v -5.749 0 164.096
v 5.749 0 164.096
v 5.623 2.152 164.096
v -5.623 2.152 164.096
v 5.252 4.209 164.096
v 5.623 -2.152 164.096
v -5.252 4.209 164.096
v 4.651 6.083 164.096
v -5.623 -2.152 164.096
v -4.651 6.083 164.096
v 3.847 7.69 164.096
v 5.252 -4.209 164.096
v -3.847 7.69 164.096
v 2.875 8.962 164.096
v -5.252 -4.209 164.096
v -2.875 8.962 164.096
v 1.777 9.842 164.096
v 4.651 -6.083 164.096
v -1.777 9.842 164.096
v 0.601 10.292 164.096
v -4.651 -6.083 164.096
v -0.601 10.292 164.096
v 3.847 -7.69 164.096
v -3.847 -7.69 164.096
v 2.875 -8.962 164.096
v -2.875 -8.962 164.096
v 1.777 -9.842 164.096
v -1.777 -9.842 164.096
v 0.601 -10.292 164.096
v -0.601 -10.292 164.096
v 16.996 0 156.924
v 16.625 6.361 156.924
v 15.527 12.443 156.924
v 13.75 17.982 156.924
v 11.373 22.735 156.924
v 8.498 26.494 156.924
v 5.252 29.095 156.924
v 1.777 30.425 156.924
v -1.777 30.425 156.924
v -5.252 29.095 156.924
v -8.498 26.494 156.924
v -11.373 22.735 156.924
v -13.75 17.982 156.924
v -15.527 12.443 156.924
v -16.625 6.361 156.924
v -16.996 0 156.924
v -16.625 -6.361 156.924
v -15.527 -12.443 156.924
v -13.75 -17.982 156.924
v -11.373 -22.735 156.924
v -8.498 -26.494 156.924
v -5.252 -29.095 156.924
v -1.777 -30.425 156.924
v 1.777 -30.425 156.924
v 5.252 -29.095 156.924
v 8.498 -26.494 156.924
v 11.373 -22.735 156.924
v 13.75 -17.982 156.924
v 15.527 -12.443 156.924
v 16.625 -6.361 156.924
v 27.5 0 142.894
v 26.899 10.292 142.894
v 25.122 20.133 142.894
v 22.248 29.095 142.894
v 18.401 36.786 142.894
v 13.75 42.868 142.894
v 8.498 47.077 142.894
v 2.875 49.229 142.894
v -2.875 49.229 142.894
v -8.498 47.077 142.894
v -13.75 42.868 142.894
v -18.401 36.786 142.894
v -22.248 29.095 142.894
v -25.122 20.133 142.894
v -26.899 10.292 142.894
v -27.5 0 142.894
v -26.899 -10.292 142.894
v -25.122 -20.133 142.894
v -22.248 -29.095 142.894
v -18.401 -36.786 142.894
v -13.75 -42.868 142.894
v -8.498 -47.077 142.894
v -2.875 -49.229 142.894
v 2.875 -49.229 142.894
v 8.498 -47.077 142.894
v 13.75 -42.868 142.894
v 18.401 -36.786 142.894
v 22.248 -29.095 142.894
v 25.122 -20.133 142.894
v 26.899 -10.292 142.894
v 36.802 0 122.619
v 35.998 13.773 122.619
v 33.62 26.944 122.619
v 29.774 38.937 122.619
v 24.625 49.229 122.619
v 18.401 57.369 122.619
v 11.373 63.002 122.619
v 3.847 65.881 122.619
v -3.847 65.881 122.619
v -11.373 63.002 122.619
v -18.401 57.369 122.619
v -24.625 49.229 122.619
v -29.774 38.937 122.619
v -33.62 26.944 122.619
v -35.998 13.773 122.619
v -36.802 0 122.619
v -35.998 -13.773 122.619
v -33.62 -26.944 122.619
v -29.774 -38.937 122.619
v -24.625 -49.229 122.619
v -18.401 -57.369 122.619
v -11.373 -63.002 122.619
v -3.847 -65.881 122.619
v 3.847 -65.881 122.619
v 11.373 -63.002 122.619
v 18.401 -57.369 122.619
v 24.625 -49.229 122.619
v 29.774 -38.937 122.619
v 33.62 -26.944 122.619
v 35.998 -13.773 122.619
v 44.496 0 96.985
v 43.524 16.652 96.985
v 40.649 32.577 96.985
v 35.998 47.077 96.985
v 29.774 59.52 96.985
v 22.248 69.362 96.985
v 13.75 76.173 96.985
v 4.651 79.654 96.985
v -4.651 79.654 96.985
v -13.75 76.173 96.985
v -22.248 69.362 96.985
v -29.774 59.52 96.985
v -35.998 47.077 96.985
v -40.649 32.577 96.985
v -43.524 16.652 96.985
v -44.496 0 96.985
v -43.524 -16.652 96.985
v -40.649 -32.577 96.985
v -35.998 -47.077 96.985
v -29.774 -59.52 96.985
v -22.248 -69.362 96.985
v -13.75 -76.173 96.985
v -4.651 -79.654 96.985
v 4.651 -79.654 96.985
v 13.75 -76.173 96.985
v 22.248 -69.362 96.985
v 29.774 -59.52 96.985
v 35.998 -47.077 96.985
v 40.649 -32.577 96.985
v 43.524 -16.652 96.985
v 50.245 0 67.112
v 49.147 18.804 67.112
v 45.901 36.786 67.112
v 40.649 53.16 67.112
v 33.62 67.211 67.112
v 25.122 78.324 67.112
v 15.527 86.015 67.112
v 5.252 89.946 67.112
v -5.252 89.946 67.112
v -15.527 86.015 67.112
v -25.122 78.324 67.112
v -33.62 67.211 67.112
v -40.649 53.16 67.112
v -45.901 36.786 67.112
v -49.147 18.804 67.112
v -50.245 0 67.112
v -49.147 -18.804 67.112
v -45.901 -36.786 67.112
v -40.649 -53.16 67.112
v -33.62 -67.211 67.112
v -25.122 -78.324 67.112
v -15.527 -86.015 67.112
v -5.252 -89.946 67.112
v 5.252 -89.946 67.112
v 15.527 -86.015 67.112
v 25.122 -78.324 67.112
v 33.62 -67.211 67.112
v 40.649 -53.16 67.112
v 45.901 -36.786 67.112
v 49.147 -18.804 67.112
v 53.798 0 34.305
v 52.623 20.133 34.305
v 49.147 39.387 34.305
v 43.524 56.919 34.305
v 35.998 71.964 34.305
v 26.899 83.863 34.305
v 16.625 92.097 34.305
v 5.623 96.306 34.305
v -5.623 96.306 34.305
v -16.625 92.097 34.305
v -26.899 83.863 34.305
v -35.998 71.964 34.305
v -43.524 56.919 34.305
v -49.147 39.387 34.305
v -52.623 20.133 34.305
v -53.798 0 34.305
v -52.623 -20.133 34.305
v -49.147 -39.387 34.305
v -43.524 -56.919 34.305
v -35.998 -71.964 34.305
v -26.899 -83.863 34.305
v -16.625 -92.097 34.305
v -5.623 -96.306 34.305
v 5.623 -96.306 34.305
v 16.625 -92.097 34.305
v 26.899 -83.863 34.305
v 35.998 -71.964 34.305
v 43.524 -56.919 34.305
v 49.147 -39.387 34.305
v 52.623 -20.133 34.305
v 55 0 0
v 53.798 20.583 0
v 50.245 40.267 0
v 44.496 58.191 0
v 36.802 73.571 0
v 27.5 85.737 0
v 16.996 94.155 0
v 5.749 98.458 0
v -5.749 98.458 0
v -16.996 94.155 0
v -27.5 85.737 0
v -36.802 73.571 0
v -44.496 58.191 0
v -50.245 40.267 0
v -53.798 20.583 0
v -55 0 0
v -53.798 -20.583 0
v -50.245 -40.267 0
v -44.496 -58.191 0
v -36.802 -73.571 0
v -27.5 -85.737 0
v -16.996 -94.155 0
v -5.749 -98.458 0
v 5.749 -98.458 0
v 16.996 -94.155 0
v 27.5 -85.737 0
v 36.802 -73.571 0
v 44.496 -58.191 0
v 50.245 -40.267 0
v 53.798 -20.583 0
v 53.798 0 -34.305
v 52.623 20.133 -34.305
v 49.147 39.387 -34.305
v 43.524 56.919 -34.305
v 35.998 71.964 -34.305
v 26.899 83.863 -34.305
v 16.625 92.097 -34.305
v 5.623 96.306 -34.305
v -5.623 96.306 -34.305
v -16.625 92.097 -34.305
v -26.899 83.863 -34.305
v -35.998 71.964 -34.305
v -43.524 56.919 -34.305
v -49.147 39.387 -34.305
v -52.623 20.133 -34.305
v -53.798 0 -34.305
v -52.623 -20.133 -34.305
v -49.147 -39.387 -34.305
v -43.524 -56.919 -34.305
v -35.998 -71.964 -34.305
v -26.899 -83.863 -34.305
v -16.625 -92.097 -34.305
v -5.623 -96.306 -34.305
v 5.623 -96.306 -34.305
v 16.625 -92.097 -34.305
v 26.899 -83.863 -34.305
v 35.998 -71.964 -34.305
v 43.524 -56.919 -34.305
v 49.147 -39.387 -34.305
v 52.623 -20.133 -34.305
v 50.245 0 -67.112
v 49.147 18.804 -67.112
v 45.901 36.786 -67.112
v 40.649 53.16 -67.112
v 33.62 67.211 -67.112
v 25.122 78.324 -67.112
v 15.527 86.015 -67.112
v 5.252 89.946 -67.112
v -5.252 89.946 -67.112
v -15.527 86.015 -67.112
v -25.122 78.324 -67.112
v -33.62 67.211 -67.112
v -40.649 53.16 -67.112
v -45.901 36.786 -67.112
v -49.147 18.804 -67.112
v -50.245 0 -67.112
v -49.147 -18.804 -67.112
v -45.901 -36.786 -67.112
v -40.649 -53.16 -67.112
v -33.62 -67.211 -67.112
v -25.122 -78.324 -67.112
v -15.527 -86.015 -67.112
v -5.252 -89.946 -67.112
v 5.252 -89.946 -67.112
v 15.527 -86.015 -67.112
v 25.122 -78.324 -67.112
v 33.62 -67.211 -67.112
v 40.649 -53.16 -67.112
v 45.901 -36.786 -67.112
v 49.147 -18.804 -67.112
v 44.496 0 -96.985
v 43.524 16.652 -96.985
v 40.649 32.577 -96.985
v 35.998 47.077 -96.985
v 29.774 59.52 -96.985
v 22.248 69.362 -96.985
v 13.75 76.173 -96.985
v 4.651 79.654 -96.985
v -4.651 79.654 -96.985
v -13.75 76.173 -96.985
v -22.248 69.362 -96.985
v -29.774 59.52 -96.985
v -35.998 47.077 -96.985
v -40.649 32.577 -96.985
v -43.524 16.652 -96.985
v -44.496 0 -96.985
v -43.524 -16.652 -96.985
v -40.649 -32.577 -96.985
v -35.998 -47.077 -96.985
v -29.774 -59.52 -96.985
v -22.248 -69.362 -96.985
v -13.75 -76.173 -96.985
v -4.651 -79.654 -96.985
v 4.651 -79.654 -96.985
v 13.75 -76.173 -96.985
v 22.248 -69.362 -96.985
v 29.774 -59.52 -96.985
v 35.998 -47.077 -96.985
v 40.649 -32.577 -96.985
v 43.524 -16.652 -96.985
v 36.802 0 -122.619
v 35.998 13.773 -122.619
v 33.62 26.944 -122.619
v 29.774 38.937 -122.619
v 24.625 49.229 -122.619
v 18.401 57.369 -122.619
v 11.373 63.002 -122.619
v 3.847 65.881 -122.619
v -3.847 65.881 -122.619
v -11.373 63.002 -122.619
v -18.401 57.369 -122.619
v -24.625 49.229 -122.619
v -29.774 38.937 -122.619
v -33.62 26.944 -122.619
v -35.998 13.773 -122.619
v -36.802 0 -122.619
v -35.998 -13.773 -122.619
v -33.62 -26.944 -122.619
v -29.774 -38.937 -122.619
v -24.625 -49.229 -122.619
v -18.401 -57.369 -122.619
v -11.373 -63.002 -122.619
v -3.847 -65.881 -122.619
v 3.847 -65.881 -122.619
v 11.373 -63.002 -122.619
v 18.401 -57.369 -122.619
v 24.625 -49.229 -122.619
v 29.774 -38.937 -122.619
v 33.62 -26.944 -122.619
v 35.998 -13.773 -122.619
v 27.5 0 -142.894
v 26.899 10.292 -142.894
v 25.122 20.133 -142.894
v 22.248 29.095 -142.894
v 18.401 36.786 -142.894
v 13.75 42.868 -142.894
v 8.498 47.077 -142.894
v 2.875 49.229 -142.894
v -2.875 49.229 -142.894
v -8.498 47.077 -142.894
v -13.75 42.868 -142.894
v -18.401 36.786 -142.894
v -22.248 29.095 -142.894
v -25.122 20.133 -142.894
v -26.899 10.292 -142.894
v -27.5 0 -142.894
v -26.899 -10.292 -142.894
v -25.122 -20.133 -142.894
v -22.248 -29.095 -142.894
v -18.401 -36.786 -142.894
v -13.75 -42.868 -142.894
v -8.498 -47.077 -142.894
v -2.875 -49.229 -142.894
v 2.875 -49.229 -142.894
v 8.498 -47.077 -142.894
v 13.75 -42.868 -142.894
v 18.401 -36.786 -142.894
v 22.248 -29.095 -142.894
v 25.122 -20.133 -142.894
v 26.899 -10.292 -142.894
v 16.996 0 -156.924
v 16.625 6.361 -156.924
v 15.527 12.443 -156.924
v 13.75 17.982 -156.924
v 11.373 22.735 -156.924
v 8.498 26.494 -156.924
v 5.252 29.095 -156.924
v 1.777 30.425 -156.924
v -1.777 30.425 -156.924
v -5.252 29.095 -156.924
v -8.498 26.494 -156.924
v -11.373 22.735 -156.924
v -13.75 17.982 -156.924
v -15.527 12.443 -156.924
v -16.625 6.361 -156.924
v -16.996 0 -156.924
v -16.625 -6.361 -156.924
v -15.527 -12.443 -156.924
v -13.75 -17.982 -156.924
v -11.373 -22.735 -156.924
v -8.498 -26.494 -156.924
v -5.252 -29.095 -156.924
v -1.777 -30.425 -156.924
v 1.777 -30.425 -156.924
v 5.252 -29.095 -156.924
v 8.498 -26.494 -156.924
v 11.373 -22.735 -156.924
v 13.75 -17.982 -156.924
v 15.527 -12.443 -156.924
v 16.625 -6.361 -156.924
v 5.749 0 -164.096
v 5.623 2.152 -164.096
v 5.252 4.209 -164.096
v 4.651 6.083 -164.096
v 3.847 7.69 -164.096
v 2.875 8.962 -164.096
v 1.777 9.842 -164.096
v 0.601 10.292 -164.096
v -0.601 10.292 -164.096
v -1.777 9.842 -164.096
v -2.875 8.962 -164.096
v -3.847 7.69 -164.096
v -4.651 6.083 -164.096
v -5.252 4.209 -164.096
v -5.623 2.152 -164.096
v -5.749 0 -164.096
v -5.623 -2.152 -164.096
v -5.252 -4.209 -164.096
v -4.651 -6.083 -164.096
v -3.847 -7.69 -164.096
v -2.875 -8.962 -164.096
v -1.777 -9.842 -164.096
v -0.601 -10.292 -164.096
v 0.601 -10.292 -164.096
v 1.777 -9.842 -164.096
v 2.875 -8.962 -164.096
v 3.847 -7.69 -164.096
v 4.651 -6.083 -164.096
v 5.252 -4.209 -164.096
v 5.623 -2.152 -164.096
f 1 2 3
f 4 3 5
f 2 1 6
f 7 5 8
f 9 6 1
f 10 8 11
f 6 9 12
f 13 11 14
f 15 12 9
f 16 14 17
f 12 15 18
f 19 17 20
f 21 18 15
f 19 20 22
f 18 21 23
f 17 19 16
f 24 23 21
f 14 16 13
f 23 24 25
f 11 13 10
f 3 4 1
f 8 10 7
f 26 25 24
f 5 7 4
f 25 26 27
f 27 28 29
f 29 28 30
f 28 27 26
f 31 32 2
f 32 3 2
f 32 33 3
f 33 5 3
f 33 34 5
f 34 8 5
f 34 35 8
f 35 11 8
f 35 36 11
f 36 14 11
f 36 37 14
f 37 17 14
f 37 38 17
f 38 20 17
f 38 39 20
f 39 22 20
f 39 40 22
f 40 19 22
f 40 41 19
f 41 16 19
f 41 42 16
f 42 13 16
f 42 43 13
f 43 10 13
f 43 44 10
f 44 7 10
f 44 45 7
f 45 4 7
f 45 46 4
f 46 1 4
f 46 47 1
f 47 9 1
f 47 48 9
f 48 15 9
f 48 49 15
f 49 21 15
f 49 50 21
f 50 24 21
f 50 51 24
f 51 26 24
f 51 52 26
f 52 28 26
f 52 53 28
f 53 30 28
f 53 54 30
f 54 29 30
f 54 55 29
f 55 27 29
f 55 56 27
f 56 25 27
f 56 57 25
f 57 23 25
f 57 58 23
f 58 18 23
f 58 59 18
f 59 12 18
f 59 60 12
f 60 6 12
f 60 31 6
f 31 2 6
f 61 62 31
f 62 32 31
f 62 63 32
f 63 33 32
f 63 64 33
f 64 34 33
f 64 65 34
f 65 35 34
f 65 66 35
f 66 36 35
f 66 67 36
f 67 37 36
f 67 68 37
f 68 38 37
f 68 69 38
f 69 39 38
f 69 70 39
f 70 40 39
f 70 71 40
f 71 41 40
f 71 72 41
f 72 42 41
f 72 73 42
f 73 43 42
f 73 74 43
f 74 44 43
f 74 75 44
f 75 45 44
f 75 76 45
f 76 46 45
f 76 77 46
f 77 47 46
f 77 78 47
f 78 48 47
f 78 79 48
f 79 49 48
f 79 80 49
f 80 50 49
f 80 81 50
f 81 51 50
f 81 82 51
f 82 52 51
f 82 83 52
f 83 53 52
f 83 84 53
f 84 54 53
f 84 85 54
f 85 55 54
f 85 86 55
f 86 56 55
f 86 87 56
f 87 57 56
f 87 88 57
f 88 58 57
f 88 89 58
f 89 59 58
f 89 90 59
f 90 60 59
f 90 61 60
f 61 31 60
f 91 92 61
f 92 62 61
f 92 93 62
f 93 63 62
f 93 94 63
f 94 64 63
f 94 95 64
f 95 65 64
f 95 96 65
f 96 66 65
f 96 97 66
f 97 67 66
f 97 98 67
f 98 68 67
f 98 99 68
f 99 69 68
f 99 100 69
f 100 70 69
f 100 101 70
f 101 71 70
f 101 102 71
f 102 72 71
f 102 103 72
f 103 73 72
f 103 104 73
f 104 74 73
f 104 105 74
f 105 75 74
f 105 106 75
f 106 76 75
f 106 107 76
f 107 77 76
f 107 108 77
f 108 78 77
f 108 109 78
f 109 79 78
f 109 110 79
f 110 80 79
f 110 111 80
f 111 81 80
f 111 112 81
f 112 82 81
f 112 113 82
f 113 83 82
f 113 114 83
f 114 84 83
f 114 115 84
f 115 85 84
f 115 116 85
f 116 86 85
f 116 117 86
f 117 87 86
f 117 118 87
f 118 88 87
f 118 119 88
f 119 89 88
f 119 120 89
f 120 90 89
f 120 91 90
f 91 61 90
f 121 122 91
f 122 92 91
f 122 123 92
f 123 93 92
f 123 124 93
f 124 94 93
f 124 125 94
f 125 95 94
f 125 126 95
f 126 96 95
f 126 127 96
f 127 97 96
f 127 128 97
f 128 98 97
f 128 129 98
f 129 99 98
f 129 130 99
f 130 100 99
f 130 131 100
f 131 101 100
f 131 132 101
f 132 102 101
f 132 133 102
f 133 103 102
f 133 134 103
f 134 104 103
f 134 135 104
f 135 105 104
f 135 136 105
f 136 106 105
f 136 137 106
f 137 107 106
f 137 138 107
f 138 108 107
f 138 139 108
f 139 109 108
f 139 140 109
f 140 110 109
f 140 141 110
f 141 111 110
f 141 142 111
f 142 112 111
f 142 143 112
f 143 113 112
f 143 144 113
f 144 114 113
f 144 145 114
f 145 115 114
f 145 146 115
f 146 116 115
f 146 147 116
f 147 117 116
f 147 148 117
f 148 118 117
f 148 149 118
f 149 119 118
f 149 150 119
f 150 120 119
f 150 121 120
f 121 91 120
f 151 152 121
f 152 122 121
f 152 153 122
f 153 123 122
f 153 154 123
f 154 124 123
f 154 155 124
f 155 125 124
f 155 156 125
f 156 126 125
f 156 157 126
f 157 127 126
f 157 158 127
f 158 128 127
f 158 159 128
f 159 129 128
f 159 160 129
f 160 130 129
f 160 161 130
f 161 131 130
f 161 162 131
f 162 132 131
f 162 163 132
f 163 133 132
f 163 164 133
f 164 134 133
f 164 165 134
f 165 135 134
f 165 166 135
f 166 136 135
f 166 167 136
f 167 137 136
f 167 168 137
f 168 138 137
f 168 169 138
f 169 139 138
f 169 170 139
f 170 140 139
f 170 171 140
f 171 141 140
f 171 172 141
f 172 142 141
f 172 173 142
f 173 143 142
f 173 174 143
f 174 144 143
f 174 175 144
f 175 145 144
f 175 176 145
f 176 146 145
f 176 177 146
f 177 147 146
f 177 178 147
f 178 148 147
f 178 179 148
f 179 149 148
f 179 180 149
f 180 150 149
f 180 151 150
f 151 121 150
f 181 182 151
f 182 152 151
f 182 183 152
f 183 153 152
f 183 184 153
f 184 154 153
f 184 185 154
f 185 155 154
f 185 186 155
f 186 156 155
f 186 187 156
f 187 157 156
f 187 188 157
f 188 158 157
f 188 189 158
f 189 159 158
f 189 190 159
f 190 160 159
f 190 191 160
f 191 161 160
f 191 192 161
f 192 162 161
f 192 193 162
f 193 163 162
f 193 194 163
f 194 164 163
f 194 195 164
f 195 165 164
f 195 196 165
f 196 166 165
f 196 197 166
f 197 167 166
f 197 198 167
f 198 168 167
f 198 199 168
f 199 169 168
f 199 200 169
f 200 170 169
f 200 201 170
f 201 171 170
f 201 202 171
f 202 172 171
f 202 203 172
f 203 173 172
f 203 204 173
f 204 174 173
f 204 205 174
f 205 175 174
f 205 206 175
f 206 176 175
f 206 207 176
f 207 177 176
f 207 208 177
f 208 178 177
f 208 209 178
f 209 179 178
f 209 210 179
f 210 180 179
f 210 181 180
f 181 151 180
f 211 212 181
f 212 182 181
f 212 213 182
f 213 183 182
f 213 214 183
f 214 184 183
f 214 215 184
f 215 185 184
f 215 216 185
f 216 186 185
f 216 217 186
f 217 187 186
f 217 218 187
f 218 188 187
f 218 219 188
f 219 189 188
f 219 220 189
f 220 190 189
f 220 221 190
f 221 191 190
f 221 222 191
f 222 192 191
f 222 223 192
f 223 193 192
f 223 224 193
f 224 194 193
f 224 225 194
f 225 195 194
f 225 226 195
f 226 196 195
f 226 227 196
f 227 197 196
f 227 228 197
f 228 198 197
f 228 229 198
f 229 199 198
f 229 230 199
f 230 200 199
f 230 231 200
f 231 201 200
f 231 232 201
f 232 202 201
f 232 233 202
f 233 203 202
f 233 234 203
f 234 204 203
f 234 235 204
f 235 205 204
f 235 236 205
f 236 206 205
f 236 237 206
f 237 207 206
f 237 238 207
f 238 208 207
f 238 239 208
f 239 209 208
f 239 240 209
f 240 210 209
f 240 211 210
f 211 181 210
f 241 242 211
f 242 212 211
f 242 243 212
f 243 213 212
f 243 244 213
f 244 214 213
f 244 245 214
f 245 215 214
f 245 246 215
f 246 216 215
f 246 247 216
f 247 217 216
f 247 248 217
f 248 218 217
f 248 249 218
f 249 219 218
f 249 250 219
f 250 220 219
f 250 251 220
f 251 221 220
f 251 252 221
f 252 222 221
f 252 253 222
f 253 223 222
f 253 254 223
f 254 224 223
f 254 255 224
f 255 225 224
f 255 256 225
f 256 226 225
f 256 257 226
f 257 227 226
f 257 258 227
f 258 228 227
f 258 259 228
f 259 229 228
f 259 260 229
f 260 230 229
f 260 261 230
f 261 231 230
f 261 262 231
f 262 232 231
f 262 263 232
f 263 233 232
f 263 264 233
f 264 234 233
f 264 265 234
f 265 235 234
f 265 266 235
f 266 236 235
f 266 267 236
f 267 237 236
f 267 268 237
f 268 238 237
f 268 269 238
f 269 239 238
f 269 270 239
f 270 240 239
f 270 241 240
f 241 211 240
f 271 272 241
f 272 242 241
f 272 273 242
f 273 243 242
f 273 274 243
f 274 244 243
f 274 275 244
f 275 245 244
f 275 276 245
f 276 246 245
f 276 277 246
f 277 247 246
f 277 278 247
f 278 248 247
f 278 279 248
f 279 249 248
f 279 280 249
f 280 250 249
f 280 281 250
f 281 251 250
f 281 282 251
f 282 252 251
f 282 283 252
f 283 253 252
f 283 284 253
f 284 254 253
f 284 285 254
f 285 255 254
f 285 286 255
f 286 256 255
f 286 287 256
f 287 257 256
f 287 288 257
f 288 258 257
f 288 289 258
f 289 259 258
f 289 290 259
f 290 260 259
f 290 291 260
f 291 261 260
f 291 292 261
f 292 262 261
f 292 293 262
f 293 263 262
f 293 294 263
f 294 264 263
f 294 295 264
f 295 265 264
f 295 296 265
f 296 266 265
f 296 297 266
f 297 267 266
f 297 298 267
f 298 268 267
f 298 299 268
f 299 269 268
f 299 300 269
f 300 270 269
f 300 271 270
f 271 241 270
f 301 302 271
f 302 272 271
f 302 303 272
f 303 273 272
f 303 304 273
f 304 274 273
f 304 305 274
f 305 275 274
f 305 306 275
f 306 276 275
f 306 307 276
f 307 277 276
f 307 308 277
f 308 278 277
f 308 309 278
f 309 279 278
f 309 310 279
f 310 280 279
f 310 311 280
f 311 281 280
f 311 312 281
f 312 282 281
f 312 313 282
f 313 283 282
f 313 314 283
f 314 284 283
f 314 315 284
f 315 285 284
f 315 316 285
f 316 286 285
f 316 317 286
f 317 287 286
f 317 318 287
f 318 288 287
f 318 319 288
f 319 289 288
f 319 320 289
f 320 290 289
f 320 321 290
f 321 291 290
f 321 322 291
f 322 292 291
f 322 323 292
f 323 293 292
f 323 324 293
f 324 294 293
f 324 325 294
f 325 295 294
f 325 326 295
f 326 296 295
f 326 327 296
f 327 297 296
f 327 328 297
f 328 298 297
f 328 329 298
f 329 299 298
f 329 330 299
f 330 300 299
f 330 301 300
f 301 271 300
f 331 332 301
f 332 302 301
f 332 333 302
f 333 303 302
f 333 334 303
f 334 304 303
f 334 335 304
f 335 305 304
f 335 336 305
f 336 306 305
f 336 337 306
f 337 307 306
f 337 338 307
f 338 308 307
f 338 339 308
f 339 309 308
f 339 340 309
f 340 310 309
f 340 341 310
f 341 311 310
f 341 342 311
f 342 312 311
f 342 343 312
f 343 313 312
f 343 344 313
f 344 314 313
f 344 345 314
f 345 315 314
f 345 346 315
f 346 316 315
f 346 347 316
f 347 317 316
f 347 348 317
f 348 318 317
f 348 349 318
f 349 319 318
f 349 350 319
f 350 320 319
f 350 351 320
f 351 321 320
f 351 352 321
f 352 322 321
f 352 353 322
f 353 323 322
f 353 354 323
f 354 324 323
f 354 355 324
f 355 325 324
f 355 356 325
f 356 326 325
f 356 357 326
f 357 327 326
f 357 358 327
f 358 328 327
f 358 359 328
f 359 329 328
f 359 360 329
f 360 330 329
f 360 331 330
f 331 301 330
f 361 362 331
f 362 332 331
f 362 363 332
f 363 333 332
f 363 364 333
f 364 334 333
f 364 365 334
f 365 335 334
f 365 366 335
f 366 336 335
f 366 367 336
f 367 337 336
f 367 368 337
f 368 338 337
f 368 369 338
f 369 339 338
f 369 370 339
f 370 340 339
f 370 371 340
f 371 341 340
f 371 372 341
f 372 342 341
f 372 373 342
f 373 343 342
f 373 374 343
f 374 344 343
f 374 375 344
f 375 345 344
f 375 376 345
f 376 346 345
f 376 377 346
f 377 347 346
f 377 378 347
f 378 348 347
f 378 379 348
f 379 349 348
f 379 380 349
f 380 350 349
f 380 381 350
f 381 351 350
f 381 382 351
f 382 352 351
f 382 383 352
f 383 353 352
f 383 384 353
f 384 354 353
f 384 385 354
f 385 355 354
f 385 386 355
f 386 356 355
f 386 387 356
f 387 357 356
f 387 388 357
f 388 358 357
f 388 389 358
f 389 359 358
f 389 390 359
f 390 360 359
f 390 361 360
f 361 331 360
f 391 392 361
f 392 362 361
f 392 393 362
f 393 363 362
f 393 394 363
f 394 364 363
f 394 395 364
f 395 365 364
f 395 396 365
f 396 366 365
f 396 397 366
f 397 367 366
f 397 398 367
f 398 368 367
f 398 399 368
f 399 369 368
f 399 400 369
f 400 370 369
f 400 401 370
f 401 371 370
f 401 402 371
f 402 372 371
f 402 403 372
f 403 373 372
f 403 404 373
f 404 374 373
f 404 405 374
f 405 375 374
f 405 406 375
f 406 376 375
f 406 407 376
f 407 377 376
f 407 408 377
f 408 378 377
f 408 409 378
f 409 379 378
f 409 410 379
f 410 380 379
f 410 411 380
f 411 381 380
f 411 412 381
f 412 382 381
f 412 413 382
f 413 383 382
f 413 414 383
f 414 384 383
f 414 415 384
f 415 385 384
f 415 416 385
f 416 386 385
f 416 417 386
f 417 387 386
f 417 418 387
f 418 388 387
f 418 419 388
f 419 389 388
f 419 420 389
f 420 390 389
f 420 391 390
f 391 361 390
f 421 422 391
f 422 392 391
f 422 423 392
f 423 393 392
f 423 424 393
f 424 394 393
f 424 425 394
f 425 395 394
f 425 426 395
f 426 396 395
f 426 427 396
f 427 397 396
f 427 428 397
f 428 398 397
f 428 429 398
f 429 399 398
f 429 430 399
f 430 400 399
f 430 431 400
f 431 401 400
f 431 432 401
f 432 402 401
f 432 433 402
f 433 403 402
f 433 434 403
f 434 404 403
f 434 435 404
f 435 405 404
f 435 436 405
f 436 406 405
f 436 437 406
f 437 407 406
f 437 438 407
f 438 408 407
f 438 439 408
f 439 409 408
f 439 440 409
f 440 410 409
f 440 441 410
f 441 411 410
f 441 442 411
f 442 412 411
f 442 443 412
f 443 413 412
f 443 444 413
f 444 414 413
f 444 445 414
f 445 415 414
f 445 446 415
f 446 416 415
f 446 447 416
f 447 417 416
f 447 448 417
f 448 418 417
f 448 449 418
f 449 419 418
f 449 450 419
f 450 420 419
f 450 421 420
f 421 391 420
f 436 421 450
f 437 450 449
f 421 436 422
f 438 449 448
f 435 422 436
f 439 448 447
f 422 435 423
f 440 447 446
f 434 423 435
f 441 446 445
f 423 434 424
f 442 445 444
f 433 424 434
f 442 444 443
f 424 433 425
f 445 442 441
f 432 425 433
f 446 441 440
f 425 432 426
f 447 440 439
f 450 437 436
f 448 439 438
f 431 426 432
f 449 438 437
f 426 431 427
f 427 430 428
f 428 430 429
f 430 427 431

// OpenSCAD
// Generated by SolidPython 1.0.1 on 2020-07-29 00:46:46


scale(v = [5, 9, 15]) {
	sphere(r = 11);
}
/***********************************************
*********      SolidPython code:      **********
************************************************
 
# import packages: SolidPython
from solid import *
from solid.utils import *
from itertools import chain, combinations, permutations


class Resize:

    def __init__(self, scad_file):
        self.scad_file = scad_file
        #self.scad_file = import_scad(scad_file)
        # cone/cylinder param:
        self.r1 = 0
        self.r2 = 0
        self.h = 0
        # rectangular prism param:
        self.w = 0
        self.l = 0
        # ellipse param:
        self.r = 0

    # import OpenScad code (file name corresponds to shape)


    # classify shape + parameters
    def assign(self, param1, param2, param3):
        if self.scad_file == 'cone.scad':
            self.r1 = param1
            self.r2 = param2
            self.h = param3
        elif self.scad_file == 'cylinder.scad':
            self.r1 = param1
            self.r2 = param2
            self.h = param3
        elif self.scad_file == 'rectangularPrism.scad':
            self.h = param1
            self.l = param2
            self.w = param3
        else:
            self.r = param1
            self.h = param2

    # resize parameters
    def iterate(self):
        x = range(3, 20, 2)
        i = 1
        if self.scad_file == 'cone.scad':
            tempList = list(permutations(x, 2))
            for temp in tempList:
                param1 = temp[0]
                param2 = temp[1]
                filepath = 'produced_scad_files/' + 'cone' + str(param1) + '_' + str(param2) + '_' + '.scad'
                scad_render_to_file(cylinder(h=param1, r1=param2, r2=0), filepath)

        elif self.scad_file == 'cylinder.scad':
            tempList = list(permutations(x, 3))
            for temp in tempList:
                param1 = temp[0]
                param2 = temp[1]
                filepath = 'produced_scad_files/' + 'cylinder' + str(param1) + '_' + str(param2) + '_' + '.scad'
                scad_render_to_file(cylinder(h=param1, r1=param2, r2=param2), filepath)

        elif self.scad_file == 'rectangularPrism.scad':
            tempList = list(permutations(x, 3))
            for temp in tempList:
                param1 = temp[0]
                param2 = temp[1]
                param3 = temp[2]
                filepath = 'produced_scad_files/' + 'rectangularPrism' + str(param1) + '_' + str(param2) + '_' + str(
                    param3) + '.scad'
                scad_render_to_file(cube(size=(param1, param2, param3)), filepath)

        elif self.scad_file == 'ellipse.scad':
            tempList = list(permutations(x, 4))
            for temp in tempList:
                param1 = temp[0]
                param2 = temp[1]
                param3 = temp[2]
                param4 = temp[3]
                filepath = 'produced_scad_files/' + 'ellipse' + str(param1) + '_' + str(param2) + '_' + str(param3) + '_' + str(param4) + '.scad'
                scad_render_to_file(scale([param1, param2, param3])(sphere(r=param4)), filepath)

    def render_to_scadfile(self):
        scad_render_to_file(scad, 'example.scad') 
 
************************************************/
